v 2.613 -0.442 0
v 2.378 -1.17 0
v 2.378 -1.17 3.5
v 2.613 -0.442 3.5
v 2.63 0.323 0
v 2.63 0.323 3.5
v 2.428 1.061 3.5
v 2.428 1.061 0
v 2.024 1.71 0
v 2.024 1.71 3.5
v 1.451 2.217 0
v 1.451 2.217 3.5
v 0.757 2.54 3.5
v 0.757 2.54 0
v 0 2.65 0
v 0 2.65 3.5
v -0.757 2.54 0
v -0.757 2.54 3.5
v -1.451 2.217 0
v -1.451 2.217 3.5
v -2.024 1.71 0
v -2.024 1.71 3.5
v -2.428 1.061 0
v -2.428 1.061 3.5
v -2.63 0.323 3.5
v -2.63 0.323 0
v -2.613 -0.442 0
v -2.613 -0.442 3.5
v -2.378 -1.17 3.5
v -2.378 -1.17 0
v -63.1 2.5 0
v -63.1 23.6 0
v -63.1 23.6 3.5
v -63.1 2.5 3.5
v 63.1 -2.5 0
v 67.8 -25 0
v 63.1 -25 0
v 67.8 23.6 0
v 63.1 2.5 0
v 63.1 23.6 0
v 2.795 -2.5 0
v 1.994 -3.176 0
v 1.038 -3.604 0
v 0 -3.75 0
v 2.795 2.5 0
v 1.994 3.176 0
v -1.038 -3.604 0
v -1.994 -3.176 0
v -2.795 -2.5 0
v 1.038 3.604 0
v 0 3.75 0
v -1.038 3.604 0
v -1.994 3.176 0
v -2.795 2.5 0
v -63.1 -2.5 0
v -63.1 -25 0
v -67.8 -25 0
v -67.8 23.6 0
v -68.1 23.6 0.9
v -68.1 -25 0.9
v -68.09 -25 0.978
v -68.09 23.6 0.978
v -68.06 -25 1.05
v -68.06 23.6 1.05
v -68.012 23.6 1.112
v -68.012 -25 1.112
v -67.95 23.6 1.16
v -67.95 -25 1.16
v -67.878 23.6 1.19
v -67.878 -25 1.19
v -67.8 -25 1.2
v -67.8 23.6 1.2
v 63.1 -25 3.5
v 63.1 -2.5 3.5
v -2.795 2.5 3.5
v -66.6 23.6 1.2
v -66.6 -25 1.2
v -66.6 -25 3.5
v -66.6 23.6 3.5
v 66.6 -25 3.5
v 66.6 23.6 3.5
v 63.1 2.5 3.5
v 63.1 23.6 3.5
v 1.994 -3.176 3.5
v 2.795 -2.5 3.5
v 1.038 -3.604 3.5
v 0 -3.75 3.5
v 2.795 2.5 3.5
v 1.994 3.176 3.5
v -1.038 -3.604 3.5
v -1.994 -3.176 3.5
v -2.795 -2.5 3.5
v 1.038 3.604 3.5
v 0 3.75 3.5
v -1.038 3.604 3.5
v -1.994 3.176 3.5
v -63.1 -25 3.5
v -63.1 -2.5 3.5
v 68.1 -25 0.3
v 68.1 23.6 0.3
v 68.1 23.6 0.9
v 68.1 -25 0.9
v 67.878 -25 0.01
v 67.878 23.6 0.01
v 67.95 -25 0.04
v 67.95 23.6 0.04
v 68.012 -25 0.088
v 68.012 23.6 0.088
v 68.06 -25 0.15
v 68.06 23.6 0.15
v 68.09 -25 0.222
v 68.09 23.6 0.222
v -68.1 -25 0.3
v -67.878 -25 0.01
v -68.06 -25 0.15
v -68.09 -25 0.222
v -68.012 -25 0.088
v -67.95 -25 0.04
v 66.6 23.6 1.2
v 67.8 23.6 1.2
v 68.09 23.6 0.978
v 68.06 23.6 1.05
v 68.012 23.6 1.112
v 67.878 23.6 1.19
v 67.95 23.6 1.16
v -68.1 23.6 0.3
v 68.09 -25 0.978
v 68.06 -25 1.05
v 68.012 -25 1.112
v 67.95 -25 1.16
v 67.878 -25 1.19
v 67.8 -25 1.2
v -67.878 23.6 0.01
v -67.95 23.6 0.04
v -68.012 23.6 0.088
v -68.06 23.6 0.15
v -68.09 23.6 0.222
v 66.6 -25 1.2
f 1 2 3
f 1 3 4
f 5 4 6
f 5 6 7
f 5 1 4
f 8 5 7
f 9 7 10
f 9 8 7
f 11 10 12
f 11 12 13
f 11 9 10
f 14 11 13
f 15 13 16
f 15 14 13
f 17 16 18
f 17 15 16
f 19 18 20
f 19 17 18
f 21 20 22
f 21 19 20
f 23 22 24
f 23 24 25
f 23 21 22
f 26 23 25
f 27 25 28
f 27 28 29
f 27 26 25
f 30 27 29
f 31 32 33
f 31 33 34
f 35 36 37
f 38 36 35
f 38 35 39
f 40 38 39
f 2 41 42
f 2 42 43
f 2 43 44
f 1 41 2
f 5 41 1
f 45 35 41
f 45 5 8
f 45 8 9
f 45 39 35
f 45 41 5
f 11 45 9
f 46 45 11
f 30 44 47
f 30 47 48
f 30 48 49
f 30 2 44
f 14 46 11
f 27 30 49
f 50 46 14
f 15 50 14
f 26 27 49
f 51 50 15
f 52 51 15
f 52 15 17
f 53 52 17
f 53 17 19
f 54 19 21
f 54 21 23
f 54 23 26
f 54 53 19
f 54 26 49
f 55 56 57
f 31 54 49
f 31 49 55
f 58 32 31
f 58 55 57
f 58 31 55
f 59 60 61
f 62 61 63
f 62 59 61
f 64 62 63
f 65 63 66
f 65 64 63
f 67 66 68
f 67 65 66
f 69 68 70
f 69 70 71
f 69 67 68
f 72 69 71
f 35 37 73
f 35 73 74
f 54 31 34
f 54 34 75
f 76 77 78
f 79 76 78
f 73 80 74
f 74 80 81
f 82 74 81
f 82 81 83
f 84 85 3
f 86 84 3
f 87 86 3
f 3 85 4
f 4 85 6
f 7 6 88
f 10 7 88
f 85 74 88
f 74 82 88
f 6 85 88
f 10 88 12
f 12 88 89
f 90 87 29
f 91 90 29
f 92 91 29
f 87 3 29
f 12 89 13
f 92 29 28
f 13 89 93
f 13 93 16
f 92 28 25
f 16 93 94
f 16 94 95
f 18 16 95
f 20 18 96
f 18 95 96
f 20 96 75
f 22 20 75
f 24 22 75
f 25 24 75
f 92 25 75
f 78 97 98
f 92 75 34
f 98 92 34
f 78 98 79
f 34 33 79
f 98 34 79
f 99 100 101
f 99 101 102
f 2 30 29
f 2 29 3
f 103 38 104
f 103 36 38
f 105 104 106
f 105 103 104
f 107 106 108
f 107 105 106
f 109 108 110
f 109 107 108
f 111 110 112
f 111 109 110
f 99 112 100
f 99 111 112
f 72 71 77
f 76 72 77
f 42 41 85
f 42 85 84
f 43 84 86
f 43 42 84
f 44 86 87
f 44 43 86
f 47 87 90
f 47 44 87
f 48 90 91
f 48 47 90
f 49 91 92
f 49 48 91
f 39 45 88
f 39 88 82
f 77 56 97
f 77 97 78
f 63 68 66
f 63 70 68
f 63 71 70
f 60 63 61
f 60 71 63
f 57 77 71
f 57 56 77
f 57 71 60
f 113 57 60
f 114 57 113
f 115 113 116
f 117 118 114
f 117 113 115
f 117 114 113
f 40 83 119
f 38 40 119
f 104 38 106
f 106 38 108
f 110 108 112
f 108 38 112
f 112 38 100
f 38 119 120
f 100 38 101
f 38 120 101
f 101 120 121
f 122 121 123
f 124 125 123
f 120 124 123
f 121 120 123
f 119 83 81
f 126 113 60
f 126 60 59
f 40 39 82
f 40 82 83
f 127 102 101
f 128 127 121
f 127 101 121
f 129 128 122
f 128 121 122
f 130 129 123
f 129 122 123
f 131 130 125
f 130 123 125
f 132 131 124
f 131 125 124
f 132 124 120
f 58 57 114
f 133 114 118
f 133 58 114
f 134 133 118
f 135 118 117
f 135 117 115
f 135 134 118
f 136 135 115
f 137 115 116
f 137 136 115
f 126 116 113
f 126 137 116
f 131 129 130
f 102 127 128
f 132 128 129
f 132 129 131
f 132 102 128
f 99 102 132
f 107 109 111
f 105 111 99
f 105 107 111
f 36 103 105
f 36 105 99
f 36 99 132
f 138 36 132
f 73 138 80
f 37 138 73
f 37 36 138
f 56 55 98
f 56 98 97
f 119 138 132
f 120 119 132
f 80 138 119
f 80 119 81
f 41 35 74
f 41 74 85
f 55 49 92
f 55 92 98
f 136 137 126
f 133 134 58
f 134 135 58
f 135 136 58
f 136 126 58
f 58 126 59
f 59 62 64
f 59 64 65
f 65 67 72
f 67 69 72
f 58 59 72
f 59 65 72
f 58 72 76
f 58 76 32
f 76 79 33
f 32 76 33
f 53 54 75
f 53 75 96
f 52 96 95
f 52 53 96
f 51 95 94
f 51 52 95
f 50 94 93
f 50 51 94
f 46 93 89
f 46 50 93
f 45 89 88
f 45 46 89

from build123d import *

# Parameters (mm, degrees)
BOSS_EXTRUDE1_DEPTH = 3.5
SKETCH2_W           = 1.5
SKETCH2_H           = 2.3
CUT_EXTRUDE1_DEPTH  = 51
SKETCH3_W           = 136.2
SKETCH3_H           = 1.4
CUT_EXTRUDE2_DEPTH  = 4.5
FILLET1_R           = 0.3


with BuildPart() as part:
    # Sketch1 → Boss-Extrude1 (new body)
    with BuildSketch(Plane.XY):
        with BuildLine():
            Line((-63.1, 2.5), (-2.795084972, 2.5))
            ThreePointArc((-2.795084972, 2.5), (0, 3.75), (2.795084972, 2.5))
            Line((2.795084972, 2.5), (63.1, 2.5))
            Line((63.1, 2.5), (63.1, 25))
            Line((63.1, 25), (68.1, 25))
            Line((68.1, 25), (68.1, -25))
            Line((68.1, -25), (63.1, -25))
            Line((63.1, -25), (63.1, -2.5))
            Line((63.1, -2.5), (2.795084972, -2.5))
            ThreePointArc((2.795084972, -2.5), (0, -3.75), (-2.795084972, -2.5))
            Line((-2.795084972, -2.5), (-63.1, -2.5))
            Line((-63.1, -2.5), (-63.1, -25))
            Line((-63.1, -25), (-68.1, -25))
            Line((-68.1, -25), (-68.1, 25))
            Line((-68.1, 25), (-63.1, 25))
            Line((-63.1, 25), (-63.1, 2.5))
        make_face()
        with BuildLine():
            Line((-2.37773001, -1.17), (2.37773001, -1.17))
            ThreePointArc((2.37773001, -1.17), (0, 2.65), (-2.37773001, -1.17))
        make_face(mode=Mode.SUBTRACT)
    extrude(amount=BOSS_EXTRUDE1_DEPTH)

    # Sketch2 → Cut-Extrude1 (cut, through all)
    with BuildSketch(Plane.XZ.offset(25)):
        with Locations((67.35, 2.35)):
            Rectangle(SKETCH2_W, SKETCH2_H)
        with Locations((-67.35, 2.35)):
            Rectangle(SKETCH2_W, SKETCH2_H)
    extrude(amount=-CUT_EXTRUDE1_DEPTH, mode=Mode.SUBTRACT)

    # Sketch3 → Cut-Extrude2 (cut, through all)
    with BuildSketch(Plane.XY.offset(3.5)):
        with Locations((0, 24.3)):
            Rectangle(SKETCH3_W, SKETCH3_H)
    extrude(amount=-CUT_EXTRUDE2_DEPTH, mode=Mode.SUBTRACT)

    # Fillet1
    fillet1_edges = [part.edges().sort_by_distance(p)[0] for p in [
        (68.1, -0.7, 0),
        (-68.1, -0.7, 1.2),
        (68.1, -0.7, 1.2),
        (-68.1, -0.7, 0),
    ]]
    fillet(fillet1_edges, radius=FILLET1_R)


solid = part.part
